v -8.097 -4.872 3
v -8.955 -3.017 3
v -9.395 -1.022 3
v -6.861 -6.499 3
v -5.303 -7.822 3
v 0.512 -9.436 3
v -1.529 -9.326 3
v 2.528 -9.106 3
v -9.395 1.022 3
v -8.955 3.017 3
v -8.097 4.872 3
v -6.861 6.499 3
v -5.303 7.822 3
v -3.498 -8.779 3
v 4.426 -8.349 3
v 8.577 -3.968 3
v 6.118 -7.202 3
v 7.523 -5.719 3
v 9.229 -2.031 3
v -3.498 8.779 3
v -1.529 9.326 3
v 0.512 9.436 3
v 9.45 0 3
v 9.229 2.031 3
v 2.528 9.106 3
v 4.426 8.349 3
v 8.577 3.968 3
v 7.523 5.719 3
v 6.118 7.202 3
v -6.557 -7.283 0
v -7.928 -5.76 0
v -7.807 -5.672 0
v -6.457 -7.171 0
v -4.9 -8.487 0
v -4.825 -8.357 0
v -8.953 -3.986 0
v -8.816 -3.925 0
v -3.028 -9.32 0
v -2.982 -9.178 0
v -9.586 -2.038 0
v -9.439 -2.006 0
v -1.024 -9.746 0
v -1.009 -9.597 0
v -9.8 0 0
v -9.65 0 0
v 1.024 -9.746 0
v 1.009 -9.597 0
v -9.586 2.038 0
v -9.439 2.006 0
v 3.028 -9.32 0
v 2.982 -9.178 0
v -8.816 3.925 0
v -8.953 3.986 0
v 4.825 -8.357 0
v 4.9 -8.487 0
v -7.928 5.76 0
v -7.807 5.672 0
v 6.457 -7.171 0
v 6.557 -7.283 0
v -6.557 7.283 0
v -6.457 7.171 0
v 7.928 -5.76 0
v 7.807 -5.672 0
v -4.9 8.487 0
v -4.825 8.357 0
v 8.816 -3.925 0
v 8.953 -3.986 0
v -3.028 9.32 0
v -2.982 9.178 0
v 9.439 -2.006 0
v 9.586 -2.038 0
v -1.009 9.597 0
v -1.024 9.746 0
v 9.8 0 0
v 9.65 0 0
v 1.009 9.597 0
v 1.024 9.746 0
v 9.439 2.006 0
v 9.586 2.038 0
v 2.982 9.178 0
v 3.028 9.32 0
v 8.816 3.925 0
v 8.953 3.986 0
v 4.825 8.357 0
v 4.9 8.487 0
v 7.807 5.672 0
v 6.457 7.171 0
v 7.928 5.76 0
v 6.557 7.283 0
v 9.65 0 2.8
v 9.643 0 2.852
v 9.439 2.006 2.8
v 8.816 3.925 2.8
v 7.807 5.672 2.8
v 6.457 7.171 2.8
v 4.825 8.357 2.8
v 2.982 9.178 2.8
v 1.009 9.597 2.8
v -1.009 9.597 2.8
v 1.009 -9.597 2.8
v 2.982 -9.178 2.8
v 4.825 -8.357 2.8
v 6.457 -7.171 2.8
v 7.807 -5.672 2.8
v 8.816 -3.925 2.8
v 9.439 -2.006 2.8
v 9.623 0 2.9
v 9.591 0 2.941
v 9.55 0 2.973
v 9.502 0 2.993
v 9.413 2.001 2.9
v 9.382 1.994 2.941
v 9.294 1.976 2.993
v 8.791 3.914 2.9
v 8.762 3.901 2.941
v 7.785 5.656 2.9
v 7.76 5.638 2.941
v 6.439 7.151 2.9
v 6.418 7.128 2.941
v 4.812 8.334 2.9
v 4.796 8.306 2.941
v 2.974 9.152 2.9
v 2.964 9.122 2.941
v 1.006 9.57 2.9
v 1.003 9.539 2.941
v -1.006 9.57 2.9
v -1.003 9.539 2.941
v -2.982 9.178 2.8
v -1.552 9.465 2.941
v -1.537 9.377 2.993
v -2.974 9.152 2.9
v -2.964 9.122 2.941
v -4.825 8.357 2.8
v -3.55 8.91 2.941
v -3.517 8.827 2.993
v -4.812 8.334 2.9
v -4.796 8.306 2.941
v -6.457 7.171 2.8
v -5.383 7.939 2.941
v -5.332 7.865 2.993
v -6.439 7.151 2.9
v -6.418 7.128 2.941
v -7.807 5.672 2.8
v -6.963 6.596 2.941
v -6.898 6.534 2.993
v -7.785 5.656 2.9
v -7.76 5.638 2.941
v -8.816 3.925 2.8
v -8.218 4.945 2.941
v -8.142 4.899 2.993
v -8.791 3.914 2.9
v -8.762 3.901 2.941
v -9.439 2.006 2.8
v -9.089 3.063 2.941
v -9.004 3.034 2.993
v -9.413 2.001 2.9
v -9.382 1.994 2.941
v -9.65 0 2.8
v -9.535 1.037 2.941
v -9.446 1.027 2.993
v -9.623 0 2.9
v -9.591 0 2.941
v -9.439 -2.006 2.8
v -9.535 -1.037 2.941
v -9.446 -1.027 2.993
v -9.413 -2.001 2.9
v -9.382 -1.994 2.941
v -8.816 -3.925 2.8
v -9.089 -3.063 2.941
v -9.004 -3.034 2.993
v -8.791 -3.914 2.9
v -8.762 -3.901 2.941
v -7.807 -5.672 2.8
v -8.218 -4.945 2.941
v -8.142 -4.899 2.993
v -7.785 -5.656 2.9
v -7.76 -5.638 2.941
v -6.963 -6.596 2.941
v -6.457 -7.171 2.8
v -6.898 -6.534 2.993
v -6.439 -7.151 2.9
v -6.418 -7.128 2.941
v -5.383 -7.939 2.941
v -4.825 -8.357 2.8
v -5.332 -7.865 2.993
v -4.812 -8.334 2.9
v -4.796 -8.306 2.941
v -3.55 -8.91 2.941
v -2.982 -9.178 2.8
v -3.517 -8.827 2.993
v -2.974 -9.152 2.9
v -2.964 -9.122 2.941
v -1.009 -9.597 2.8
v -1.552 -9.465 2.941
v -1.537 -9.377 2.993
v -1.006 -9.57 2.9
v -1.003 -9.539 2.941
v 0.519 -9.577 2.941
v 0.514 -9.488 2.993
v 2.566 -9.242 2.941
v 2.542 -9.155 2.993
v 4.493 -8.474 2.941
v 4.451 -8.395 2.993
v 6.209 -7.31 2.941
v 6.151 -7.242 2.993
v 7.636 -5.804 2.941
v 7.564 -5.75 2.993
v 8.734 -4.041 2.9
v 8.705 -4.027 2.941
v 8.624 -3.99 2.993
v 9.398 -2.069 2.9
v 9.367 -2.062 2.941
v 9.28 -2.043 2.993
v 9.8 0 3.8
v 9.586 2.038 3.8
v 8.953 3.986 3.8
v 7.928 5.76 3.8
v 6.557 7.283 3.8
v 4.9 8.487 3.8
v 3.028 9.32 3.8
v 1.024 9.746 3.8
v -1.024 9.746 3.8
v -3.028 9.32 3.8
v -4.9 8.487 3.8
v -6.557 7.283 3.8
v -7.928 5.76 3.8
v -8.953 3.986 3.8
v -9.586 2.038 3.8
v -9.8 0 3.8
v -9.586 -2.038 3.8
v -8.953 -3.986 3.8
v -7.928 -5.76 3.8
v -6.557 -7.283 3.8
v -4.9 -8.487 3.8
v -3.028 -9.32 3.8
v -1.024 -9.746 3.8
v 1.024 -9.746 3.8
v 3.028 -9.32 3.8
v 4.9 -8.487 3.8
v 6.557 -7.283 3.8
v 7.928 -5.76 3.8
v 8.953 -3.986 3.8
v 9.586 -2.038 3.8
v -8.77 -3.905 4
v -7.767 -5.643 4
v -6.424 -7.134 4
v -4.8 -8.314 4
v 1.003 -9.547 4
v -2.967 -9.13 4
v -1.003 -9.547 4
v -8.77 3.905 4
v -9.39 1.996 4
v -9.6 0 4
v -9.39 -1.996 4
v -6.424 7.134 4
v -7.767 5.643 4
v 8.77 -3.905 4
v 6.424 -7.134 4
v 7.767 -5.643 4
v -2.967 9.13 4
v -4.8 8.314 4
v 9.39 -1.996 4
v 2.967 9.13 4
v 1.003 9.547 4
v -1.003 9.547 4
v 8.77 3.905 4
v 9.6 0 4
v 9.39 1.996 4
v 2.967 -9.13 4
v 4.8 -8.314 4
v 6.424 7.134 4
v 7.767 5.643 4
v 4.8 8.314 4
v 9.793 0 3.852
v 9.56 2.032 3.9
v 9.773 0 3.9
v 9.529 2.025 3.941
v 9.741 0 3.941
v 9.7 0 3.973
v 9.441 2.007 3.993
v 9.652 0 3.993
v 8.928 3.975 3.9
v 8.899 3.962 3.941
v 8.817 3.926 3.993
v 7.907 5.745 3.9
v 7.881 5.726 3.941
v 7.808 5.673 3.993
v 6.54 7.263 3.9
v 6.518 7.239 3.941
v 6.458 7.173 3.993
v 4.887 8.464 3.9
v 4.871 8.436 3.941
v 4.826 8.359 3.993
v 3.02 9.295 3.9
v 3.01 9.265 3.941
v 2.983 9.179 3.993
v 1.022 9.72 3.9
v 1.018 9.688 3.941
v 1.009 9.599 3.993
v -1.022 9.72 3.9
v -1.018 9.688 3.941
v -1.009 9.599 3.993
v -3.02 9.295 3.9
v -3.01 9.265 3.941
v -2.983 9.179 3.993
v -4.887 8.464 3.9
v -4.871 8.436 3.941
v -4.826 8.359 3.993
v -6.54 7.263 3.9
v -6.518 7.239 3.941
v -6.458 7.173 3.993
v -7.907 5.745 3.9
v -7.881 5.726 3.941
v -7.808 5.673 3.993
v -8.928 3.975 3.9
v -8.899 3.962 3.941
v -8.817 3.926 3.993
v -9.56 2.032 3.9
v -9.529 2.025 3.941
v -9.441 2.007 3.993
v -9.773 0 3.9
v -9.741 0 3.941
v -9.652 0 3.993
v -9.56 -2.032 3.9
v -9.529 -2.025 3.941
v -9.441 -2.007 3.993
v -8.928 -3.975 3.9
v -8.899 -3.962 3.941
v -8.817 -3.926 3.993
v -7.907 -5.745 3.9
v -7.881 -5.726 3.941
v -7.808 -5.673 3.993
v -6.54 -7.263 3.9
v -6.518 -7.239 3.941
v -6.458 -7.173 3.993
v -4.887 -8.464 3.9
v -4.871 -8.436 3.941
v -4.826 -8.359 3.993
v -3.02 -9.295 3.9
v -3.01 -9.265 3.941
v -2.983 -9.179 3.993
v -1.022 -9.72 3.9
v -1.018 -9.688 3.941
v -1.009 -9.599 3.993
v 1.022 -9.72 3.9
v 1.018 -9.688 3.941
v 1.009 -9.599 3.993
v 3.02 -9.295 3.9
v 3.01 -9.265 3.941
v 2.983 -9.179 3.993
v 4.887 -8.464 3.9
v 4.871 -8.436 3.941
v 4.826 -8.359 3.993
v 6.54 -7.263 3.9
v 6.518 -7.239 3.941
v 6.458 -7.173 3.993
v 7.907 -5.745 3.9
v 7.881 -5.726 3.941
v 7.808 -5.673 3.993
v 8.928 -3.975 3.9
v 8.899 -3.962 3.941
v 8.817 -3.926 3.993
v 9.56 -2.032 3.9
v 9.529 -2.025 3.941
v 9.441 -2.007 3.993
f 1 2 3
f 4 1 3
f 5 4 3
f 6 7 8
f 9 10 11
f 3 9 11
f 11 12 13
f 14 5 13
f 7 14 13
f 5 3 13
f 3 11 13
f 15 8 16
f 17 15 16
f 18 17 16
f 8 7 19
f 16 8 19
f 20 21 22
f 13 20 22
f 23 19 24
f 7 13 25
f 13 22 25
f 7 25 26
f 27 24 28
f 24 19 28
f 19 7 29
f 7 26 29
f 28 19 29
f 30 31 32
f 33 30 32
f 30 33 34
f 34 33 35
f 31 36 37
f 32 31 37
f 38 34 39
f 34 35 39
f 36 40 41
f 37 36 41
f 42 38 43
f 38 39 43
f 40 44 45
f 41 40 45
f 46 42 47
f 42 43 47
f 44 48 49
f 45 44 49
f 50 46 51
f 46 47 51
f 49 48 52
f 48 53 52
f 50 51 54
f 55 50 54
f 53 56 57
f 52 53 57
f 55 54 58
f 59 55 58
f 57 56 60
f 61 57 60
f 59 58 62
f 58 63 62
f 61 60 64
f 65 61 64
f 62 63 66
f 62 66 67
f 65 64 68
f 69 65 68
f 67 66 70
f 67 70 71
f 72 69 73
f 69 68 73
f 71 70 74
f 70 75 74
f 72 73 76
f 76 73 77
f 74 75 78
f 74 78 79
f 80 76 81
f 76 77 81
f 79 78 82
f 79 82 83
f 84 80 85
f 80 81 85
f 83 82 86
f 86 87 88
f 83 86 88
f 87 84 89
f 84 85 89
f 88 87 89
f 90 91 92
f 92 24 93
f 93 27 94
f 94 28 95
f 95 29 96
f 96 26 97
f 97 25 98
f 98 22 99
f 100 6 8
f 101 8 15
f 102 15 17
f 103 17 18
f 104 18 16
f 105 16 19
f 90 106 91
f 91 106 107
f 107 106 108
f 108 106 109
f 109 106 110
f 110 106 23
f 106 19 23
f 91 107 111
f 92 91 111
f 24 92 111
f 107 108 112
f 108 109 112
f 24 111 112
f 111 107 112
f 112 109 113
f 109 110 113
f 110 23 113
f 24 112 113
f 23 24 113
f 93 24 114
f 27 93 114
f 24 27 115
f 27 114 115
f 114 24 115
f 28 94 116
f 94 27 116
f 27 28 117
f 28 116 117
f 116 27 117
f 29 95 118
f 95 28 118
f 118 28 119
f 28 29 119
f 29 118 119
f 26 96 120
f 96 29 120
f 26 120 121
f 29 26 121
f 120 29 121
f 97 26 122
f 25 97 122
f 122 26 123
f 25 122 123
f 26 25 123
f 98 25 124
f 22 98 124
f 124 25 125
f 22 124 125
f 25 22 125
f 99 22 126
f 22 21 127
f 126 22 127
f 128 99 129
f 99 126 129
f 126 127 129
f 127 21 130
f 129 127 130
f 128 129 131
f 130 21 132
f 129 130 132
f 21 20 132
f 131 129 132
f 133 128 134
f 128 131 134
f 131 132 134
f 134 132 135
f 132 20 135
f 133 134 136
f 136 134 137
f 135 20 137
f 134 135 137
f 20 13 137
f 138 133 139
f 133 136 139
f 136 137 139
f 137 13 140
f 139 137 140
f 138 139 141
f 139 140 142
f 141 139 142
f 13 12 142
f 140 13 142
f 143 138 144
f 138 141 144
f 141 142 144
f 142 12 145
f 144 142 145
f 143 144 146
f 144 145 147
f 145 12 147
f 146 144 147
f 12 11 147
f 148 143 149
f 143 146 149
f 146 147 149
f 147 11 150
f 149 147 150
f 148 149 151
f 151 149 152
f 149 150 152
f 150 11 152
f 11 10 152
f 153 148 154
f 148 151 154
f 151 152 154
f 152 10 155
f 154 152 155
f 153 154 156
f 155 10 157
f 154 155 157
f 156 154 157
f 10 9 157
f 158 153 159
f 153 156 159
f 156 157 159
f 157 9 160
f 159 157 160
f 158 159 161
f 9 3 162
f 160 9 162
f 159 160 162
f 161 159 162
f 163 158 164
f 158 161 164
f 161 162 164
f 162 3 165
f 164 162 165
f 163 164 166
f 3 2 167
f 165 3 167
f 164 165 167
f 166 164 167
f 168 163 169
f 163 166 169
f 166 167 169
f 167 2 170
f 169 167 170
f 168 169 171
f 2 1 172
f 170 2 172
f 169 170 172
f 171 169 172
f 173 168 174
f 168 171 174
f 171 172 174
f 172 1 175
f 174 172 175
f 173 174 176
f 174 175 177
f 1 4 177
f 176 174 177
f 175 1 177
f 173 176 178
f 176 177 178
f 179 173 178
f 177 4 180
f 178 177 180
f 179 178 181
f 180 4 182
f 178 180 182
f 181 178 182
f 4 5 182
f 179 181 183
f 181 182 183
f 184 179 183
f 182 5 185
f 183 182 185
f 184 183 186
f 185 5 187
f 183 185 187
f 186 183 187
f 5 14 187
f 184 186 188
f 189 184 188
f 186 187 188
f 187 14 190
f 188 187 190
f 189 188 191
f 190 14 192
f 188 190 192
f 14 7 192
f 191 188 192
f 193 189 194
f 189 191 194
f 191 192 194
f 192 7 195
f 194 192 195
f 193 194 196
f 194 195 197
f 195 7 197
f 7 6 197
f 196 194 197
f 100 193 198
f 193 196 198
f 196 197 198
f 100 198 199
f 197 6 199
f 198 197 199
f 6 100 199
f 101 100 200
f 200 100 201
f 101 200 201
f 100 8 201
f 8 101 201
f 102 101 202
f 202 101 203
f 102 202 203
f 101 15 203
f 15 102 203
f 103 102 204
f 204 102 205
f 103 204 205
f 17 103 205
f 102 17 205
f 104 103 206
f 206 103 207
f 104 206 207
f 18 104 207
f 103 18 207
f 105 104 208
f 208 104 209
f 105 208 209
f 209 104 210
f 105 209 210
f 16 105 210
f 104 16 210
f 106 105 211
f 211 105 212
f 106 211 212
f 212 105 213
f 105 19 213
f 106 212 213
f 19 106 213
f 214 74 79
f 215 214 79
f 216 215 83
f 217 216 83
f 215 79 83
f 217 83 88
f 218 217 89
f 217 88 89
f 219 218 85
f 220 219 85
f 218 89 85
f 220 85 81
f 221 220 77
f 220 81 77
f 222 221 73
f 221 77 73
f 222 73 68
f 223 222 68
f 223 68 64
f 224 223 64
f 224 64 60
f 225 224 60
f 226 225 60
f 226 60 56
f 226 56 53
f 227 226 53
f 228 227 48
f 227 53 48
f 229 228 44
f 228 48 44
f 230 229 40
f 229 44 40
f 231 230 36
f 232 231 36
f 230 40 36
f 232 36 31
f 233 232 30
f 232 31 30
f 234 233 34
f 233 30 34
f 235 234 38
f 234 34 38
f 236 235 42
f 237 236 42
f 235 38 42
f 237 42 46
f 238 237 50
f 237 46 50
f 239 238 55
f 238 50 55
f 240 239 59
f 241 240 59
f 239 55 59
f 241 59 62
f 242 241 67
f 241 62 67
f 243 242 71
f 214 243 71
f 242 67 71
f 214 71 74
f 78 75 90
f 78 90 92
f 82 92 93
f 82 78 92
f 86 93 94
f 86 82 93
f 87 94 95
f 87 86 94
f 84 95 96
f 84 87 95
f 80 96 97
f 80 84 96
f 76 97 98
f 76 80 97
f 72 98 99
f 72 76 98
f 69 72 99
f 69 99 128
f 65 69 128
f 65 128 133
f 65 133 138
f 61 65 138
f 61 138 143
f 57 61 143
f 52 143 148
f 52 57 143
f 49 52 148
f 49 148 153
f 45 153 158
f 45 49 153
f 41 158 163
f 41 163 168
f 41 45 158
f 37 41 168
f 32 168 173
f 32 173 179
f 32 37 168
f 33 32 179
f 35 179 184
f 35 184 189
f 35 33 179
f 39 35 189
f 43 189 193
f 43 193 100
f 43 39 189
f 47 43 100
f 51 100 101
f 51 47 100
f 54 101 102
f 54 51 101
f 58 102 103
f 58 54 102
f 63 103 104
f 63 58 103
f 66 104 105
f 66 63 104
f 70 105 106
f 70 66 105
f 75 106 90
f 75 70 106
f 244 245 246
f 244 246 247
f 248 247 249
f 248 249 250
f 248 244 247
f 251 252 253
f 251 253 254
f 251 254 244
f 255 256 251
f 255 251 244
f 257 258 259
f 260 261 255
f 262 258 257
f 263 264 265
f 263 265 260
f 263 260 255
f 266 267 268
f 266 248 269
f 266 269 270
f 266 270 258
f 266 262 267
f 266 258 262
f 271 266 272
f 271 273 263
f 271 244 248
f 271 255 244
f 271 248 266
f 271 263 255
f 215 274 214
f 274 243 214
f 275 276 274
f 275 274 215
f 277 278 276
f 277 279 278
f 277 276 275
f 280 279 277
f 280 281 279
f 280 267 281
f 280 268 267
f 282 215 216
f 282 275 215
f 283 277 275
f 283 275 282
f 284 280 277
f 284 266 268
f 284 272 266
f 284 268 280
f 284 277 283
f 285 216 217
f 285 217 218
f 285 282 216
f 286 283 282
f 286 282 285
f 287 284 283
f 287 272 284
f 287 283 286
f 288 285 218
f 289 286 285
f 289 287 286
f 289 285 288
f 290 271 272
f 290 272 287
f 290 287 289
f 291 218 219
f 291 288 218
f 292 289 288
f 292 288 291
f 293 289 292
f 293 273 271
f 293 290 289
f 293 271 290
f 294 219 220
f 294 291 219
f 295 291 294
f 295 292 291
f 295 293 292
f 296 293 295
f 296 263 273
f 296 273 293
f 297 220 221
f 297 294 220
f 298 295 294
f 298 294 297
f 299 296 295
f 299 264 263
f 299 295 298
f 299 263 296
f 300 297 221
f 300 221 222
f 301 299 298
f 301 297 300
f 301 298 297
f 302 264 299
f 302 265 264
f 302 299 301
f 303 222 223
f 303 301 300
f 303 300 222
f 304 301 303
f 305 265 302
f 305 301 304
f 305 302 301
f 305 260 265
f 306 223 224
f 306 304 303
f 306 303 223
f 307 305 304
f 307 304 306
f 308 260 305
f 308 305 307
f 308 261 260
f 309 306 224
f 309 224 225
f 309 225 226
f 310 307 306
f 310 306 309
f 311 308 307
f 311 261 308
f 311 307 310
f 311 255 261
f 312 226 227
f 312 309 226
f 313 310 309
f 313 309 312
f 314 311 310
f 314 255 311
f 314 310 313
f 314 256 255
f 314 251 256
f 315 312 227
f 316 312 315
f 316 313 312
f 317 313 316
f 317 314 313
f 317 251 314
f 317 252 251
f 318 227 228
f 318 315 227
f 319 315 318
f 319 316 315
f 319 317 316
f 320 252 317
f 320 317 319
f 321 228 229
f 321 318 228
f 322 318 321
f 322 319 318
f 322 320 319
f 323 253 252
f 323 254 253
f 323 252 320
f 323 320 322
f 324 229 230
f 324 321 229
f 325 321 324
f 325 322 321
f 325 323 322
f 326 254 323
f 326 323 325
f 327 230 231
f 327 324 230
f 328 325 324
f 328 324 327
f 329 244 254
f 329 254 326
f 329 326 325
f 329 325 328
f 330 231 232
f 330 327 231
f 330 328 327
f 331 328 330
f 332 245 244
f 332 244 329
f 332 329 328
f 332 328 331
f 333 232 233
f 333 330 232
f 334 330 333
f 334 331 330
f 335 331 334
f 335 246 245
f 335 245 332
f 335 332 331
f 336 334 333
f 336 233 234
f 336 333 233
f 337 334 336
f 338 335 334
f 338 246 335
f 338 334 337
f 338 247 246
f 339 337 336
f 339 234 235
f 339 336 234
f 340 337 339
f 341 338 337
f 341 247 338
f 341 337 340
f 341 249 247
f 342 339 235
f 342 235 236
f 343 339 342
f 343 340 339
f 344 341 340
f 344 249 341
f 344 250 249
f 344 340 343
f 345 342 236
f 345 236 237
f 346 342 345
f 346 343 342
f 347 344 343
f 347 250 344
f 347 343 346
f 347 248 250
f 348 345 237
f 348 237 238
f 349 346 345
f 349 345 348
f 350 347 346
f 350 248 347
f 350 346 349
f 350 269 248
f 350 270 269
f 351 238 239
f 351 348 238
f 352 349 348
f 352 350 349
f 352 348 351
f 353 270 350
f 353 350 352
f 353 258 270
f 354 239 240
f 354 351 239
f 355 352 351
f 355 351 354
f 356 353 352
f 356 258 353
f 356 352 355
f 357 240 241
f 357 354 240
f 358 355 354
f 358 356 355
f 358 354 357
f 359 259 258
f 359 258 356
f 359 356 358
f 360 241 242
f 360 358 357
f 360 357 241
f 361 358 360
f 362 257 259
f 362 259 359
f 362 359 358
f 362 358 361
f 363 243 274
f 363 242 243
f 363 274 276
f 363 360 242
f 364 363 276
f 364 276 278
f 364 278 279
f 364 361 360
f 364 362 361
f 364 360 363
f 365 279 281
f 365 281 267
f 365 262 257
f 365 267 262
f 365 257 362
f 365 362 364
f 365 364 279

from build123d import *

# Parameters (mm, degrees)
F0_R     = 9.8
F0_R_2   = 9.65
F1_DEPTH = 4
F2_DEPTH = 3
F3_R     = 0.2


with BuildPart() as f1:
    # F0 (on Top) → F1 (new body)
    with BuildSketch(Plane.XY):
        Circle(F0_R)
        Circle(F0_R_2, mode=Mode.SUBTRACT)
        Circle(F0_R_2)
    extrude(amount=F1_DEPTH)

    # F0 (on Top) → F2 (cut)
    with BuildSketch(Plane.XY):
        Circle(F0_R_2)
    extrude(amount=F2_DEPTH, mode=Mode.SUBTRACT)

    # F3
    f3_edges = [f1.edges().sort_by_distance(p)[0] for p in [
        (-9.8, 0, 4),
        (-9.65, 0, 3),
    ]]
    fillet(f3_edges, radius=F3_R)


solid = f1.part
